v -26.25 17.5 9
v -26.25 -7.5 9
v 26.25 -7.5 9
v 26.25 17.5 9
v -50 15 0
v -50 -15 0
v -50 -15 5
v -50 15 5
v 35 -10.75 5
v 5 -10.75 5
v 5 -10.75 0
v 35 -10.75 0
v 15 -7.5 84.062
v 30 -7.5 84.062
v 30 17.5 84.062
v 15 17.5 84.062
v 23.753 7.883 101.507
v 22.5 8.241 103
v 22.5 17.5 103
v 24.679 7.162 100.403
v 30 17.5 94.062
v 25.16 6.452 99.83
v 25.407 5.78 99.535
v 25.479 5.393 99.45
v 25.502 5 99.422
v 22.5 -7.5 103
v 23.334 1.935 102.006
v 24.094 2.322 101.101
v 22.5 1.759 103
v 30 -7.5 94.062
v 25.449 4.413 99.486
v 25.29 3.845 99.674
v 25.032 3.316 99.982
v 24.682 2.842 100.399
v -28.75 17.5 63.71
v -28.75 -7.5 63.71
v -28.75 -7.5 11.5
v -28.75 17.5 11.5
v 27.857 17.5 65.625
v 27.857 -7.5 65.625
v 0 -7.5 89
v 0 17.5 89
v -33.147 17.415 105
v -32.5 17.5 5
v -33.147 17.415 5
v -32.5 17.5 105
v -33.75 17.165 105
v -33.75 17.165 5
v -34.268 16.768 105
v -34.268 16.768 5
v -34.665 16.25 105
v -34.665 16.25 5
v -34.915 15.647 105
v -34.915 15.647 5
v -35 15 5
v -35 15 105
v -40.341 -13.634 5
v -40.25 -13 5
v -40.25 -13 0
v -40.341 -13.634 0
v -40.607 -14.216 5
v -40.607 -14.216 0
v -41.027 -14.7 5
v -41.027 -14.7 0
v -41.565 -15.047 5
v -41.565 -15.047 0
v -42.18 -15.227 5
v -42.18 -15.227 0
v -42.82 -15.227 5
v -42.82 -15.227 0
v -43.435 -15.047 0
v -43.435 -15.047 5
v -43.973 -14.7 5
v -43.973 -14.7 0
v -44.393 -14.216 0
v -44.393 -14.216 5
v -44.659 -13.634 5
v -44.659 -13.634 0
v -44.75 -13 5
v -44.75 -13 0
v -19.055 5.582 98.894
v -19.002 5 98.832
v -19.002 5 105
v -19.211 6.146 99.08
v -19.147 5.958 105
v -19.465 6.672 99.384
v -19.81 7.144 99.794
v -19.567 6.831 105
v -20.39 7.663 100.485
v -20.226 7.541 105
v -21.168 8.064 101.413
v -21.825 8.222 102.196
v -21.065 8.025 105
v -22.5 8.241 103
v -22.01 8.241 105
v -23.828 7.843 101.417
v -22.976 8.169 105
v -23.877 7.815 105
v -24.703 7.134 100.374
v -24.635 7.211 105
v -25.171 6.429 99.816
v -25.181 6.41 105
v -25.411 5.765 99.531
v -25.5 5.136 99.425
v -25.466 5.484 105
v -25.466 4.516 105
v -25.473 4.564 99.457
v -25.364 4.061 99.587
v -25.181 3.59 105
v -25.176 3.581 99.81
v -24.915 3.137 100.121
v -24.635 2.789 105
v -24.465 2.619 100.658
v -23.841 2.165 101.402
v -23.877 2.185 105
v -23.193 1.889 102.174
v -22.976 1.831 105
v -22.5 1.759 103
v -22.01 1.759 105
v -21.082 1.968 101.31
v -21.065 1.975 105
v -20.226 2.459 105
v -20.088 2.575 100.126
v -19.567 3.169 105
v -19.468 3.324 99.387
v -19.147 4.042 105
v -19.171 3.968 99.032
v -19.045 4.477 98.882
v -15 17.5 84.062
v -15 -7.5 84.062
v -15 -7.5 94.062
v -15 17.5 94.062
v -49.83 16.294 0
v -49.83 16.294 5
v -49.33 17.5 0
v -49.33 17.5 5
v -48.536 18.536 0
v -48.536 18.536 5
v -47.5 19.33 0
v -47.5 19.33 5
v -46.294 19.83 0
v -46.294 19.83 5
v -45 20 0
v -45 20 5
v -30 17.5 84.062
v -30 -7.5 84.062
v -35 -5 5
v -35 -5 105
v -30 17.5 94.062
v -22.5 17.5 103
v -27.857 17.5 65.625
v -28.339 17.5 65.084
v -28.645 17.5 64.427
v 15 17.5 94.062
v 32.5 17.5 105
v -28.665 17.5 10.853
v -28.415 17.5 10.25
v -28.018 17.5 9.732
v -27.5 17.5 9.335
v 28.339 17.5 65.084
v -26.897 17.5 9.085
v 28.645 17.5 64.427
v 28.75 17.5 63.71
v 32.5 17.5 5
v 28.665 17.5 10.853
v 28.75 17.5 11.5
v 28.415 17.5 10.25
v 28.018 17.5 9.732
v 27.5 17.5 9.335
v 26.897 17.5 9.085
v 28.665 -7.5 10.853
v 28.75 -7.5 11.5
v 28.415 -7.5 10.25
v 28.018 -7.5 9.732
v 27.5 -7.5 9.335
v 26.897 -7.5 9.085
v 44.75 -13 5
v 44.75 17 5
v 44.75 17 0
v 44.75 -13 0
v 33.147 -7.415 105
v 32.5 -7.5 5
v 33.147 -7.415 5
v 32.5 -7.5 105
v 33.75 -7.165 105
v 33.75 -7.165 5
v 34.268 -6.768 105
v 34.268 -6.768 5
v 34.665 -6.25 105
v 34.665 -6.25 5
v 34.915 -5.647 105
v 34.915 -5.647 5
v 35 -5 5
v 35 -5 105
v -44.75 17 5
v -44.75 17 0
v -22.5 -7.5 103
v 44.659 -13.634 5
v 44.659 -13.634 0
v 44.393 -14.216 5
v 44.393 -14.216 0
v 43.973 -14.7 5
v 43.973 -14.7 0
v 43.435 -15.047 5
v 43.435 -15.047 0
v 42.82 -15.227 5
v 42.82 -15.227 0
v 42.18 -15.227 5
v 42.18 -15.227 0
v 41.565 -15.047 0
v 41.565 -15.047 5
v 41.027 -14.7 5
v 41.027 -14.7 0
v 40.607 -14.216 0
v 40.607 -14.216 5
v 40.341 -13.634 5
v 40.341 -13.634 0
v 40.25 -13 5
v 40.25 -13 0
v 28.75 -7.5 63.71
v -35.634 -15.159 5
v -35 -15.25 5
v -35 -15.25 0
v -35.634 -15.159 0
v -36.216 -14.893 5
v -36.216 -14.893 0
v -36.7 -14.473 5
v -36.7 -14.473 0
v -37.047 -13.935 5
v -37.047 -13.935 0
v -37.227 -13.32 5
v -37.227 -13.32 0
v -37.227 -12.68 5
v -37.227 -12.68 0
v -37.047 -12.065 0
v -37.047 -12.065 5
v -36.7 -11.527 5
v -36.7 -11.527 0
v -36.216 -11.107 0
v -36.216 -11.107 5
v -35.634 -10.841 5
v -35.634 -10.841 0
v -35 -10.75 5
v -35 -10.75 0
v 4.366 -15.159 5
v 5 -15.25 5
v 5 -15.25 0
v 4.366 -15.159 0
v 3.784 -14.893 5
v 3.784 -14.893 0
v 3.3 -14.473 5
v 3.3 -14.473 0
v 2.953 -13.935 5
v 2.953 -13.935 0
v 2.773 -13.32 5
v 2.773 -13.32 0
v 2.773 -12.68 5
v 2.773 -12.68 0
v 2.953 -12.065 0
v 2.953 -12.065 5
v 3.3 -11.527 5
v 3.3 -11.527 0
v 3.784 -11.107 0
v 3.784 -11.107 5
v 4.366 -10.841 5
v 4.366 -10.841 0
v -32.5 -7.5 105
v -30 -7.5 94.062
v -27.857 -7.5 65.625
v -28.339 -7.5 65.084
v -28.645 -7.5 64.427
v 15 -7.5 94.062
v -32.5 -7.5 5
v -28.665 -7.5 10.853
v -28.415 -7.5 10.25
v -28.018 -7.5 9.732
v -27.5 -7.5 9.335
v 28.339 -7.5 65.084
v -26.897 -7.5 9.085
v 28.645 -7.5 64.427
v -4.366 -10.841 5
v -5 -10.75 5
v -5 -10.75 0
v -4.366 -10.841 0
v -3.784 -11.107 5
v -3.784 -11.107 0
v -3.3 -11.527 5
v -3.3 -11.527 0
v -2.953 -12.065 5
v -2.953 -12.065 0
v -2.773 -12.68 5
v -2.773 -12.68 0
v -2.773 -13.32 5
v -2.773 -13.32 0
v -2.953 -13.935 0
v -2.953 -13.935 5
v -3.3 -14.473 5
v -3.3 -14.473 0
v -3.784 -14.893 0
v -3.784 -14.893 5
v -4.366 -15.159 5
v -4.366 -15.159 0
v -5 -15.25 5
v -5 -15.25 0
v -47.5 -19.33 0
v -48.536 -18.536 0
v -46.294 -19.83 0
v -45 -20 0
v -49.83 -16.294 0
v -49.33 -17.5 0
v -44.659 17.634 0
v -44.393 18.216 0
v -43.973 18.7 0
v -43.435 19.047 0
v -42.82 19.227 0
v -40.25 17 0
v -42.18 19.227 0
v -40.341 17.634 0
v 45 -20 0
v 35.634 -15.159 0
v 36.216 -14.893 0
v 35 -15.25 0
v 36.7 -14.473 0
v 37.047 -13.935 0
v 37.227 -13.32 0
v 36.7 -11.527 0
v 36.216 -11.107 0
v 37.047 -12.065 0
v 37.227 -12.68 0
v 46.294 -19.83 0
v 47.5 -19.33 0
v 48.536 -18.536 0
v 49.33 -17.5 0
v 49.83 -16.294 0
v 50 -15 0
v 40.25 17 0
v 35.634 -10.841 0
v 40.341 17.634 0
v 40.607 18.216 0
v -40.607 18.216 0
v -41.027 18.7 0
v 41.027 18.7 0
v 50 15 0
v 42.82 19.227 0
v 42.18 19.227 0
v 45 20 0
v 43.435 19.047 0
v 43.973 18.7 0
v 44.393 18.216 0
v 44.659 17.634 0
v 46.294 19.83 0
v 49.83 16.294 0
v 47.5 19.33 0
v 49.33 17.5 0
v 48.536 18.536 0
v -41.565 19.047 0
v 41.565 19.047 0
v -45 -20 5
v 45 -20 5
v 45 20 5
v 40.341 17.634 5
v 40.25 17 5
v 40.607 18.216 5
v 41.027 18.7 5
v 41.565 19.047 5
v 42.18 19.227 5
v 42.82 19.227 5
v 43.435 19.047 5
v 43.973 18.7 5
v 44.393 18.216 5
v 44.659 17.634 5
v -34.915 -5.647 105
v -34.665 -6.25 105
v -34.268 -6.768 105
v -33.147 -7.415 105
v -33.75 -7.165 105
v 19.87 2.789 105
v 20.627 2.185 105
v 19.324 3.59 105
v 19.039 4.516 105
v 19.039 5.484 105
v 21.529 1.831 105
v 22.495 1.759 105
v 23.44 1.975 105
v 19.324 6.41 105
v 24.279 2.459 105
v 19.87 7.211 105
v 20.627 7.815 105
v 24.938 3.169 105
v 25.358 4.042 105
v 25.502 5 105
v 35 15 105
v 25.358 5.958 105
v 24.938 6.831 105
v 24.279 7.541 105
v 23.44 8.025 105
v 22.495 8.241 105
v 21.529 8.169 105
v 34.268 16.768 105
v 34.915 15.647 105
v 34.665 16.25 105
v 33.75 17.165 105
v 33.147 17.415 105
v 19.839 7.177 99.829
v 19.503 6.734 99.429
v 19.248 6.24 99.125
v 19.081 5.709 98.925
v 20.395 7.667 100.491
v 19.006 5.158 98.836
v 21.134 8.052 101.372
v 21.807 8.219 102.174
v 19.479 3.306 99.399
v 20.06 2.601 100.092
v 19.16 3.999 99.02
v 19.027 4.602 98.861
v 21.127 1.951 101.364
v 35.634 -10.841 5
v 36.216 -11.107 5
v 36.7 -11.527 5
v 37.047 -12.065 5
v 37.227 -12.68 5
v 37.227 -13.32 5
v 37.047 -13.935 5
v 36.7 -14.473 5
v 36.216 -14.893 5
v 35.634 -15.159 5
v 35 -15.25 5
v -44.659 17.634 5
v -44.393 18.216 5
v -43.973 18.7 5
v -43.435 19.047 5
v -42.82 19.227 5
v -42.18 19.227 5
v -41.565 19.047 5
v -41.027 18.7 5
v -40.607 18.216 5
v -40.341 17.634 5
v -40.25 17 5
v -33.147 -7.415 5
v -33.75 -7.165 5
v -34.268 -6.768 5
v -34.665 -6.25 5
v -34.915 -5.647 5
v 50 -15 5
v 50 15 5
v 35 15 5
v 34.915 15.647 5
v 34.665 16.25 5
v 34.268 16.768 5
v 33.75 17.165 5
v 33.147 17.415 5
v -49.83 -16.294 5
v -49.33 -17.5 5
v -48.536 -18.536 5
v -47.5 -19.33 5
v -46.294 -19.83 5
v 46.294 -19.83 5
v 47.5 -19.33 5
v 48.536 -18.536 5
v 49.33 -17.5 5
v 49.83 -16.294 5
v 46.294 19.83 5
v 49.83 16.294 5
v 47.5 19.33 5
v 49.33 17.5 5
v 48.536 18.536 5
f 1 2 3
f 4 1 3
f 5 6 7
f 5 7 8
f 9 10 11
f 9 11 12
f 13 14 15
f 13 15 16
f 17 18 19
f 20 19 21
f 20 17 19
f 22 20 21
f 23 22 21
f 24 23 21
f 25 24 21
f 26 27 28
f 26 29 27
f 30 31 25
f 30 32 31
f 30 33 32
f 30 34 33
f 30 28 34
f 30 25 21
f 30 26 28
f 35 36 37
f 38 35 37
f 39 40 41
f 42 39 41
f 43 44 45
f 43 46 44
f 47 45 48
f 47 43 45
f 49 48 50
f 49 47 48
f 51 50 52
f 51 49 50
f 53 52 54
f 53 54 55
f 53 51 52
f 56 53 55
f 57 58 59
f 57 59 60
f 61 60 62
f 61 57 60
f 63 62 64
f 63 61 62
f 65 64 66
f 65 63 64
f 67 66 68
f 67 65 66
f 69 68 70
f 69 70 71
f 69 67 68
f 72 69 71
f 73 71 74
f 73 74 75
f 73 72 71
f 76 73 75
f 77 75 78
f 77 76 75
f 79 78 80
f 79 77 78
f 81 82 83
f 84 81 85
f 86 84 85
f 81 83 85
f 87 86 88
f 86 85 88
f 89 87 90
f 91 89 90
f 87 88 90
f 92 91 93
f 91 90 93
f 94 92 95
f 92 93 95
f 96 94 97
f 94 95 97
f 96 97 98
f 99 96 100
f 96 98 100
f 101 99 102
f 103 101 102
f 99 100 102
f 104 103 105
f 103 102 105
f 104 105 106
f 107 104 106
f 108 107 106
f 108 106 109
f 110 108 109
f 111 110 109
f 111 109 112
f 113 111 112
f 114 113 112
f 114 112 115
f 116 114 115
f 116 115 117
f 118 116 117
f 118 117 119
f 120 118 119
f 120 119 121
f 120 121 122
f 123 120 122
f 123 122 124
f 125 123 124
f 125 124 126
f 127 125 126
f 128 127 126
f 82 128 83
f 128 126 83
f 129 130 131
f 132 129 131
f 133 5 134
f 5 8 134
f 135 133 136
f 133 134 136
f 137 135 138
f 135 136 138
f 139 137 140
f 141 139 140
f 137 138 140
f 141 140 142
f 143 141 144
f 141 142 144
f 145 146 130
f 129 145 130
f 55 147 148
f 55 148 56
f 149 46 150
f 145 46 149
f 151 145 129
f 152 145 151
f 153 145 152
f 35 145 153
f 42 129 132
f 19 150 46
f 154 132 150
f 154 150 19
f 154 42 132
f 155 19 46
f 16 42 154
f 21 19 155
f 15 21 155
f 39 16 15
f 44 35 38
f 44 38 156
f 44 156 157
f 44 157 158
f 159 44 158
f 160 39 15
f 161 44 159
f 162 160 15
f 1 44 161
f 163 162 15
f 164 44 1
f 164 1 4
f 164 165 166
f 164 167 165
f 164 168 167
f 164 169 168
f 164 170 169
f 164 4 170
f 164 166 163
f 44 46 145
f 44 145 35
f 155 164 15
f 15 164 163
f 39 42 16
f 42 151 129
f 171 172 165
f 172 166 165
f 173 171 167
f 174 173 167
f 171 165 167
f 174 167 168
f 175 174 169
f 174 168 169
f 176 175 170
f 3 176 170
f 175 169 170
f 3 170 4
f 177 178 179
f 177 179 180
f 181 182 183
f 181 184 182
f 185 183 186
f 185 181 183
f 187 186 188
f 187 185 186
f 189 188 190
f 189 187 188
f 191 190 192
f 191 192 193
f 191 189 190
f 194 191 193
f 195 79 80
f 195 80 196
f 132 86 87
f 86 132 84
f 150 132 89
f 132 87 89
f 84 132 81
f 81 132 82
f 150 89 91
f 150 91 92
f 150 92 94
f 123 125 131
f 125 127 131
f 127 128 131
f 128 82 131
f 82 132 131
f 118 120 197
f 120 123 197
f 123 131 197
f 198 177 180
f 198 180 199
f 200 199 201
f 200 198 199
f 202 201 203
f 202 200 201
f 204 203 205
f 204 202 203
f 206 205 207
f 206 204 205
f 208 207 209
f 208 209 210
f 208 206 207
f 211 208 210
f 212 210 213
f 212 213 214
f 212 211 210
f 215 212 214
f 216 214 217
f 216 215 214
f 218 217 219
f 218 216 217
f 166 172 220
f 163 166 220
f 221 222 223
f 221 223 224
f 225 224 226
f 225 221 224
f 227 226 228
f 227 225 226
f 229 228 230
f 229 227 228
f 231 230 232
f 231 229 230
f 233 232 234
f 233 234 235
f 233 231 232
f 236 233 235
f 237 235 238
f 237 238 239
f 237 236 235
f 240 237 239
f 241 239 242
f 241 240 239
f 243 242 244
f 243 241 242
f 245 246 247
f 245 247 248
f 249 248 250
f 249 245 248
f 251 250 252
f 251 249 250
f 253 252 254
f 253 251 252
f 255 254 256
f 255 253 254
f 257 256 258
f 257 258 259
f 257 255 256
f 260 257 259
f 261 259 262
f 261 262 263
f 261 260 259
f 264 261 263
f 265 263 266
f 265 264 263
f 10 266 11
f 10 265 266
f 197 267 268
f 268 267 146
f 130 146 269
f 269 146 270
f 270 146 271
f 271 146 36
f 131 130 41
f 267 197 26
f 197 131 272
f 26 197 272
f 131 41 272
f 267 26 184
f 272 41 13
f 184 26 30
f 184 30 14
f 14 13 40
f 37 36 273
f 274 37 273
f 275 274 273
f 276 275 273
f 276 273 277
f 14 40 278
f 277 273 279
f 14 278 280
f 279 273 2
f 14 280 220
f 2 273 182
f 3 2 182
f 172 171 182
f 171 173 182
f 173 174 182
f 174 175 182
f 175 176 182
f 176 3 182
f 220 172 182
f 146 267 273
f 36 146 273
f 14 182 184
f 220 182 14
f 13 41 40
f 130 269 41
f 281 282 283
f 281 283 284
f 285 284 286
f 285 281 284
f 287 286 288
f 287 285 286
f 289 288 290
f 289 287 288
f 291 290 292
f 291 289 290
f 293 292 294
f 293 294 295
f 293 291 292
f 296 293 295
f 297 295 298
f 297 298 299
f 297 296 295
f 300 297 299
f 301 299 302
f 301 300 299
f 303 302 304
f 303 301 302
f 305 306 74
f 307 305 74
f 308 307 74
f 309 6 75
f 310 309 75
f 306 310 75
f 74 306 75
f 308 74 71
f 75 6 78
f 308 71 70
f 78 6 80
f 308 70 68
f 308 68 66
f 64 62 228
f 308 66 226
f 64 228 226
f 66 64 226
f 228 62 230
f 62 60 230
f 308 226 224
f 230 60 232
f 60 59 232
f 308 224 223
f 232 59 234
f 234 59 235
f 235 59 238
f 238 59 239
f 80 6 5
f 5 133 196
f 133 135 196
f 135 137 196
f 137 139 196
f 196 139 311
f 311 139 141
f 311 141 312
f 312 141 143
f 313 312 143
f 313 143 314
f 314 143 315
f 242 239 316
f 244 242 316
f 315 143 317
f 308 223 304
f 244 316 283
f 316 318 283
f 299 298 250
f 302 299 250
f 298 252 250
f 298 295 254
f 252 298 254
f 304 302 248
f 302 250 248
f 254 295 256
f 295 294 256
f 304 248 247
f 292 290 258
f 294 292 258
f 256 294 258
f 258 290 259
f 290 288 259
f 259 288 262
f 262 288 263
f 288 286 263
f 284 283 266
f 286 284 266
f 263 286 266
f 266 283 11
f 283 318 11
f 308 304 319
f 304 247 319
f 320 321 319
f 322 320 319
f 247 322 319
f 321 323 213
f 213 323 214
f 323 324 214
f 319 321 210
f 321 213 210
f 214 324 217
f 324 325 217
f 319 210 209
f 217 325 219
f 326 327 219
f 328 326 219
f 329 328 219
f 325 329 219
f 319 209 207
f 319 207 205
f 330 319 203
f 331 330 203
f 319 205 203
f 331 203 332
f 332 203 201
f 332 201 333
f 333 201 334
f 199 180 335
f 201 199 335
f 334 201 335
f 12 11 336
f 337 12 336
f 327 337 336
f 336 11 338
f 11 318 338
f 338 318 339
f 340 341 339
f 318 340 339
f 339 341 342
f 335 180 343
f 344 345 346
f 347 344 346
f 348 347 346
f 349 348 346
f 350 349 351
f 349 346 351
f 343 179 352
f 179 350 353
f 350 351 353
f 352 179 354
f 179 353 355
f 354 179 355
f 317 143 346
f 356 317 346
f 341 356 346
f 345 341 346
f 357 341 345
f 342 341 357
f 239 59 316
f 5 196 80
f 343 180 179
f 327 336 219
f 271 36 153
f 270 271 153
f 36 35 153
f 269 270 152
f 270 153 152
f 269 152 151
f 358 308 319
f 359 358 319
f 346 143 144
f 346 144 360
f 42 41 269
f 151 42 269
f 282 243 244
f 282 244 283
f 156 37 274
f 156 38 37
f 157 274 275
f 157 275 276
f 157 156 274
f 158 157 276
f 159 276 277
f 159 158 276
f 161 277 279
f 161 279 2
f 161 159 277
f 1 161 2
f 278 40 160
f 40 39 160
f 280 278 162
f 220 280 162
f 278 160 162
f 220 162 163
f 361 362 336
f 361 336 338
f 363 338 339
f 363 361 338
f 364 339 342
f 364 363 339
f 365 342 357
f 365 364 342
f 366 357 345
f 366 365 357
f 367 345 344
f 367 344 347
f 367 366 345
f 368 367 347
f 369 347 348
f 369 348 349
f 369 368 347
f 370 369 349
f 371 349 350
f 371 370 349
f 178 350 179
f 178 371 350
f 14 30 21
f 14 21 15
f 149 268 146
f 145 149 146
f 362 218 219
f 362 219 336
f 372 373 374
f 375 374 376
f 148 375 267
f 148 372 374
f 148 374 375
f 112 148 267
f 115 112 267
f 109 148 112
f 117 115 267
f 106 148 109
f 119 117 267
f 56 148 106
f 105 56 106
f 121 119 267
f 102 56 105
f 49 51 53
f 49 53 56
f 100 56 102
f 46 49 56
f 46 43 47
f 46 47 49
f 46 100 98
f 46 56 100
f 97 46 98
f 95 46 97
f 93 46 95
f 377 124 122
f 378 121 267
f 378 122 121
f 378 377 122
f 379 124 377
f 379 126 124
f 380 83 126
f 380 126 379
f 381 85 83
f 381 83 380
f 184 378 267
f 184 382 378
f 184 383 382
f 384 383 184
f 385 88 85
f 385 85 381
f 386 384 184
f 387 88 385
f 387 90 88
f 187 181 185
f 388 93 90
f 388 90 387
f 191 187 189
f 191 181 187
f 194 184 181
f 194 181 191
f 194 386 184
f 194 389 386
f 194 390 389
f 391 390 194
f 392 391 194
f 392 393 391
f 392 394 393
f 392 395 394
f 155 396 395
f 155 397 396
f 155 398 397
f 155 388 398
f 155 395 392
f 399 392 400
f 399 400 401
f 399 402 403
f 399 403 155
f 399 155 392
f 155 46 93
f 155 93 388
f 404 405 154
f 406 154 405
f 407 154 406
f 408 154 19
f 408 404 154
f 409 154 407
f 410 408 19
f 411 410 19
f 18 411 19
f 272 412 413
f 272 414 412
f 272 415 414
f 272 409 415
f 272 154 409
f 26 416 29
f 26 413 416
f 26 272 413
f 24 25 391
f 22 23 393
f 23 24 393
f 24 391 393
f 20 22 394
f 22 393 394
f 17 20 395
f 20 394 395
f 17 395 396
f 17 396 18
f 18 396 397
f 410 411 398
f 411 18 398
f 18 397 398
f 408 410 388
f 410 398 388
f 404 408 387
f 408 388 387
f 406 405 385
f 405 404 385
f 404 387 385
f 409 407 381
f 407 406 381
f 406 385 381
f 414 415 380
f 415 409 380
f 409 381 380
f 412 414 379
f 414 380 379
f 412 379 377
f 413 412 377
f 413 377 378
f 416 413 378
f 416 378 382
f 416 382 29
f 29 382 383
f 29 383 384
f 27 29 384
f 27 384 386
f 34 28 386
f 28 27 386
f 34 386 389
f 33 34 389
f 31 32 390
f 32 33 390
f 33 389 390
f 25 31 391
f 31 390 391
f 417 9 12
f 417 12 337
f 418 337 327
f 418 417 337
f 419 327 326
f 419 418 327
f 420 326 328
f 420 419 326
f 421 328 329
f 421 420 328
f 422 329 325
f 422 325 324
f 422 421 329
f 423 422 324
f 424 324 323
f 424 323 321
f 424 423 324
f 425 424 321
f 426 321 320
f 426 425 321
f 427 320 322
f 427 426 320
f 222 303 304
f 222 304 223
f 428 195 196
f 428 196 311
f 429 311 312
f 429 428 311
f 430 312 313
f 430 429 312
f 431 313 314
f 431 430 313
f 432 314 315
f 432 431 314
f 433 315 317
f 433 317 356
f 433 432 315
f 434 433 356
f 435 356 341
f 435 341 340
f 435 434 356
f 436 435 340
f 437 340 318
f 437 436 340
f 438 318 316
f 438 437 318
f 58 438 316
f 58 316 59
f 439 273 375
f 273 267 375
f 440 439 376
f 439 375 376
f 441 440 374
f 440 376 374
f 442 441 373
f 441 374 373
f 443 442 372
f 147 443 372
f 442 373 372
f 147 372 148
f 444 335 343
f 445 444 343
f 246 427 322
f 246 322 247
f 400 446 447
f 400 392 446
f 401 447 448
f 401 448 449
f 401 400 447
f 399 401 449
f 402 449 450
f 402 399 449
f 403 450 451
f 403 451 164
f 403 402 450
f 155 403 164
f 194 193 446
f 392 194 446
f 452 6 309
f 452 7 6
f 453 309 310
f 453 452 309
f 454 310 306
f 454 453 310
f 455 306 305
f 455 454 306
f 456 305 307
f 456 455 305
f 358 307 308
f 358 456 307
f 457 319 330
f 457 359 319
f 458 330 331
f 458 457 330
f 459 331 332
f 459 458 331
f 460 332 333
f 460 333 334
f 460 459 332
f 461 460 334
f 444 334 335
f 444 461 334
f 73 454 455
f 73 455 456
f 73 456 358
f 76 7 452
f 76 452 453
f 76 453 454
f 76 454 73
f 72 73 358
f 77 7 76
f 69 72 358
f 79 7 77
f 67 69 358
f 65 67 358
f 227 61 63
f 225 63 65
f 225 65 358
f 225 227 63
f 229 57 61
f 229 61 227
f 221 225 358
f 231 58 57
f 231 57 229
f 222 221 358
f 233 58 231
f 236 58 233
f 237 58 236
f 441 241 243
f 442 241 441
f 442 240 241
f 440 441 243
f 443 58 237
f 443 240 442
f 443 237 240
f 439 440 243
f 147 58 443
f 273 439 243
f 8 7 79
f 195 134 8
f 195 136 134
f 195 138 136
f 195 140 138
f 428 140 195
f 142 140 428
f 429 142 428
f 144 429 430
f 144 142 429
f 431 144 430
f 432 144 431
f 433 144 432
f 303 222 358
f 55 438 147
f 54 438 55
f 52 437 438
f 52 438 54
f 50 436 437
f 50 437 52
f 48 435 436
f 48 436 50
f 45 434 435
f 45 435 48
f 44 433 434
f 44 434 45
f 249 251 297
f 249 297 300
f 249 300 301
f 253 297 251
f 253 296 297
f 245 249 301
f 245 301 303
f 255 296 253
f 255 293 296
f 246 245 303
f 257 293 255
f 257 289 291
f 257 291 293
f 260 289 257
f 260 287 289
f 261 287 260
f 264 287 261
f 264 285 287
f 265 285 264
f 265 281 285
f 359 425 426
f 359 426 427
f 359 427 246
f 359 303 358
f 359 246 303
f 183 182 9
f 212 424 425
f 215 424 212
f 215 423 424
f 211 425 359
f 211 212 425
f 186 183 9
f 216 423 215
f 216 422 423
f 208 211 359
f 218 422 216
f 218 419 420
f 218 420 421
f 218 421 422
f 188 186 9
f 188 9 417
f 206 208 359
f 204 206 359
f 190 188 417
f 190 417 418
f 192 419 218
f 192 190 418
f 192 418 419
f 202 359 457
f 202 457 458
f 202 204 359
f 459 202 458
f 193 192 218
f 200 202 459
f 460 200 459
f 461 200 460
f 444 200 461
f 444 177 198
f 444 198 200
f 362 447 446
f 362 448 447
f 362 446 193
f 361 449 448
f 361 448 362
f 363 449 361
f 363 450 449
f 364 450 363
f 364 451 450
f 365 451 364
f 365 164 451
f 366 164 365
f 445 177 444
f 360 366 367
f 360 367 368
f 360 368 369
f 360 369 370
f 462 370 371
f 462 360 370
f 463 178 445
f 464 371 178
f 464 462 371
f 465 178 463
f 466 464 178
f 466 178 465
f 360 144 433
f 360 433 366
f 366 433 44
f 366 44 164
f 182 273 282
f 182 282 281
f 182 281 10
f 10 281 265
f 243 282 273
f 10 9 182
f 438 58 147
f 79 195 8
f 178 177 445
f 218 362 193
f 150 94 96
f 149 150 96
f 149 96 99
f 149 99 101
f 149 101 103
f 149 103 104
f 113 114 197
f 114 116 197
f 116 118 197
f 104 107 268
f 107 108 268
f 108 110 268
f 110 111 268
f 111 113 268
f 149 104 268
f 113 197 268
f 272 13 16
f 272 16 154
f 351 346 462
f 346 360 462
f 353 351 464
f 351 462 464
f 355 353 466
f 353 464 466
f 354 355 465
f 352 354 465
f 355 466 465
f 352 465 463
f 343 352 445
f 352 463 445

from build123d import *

# Parameters (mm, degrees)
SKETCH1_W           = 100
SKETCH1_H           = 40
BOSS_EXTRUDE1_DEPTH = 5
CUT_EXTRUDE1_DEPTH  = 5
CUT_EXTRUDE2_DEPTH  = 5
CUT_EXTRUDE3_DEPTH  = 5
CUT_EXTRUDE4_DEPTH  = 5
SKETCH3_W           = 70
SKETCH3_H           = 25
BOSS_EXTRUDE2_DEPTH = 100
FILLET1_R           = 5
FILLET2_R           = 2.5
CUT_EXTRUDE8_DEPTH  = 120.504184027
FILLET3_R           = 2.5
CUT_EXTRUDE9_DEPTH  = 120.504184027
CUT_EXTRUDE10_REACH = 120.004
SKETCH10_R          = 3.25


with BuildPart() as part:
    # Sketch1 → Boss-Extrude1 (new body)
    with BuildSketch(Plane.XY):
        Rectangle(SKETCH1_W, SKETCH1_H)
    extrude(amount=BOSS_EXTRUDE1_DEPTH)

    # Sketch2 → Cut-Extrude1 (cut)
    with BuildSketch(Plane.XY.offset(5)):
        with BuildLine():
            Line((-40.25, 17), (-40.25, -13))
            ThreePointArc((-40.25, -13), (-42.5, -15.25), (-44.75, -13))
            Line((-44.75, -13), (-44.75, 17))
            ThreePointArc((-44.75, 17), (-42.5, 19.25), (-40.25, 17))
        make_face()
    extrude(amount=-CUT_EXTRUDE1_DEPTH, mode=Mode.SUBTRACT)

    # Sketch2<3> → Cut-Extrude2 (cut)
    with BuildSketch(Plane.XY.offset(5)):
        with BuildLine():
            Line((-35, -10.75), (-5, -10.75))
            ThreePointArc((-5, -10.75), (-2.75, -13), (-5, -15.25))
            Line((-5, -15.25), (-35, -15.25))
            ThreePointArc((-35, -15.25), (-37.25, -13), (-35, -10.75))
        make_face()
    extrude(amount=-CUT_EXTRUDE2_DEPTH, mode=Mode.SUBTRACT)

    # Sketch2<4> → Cut-Extrude3 (cut)
    with BuildSketch(Plane.XY.offset(5)):
        with BuildLine():
            Line((5, -10.75), (35, -10.75))
            ThreePointArc((35, -10.75), (37.25, -13), (35, -15.25))
            Line((35, -15.25), (5, -15.25))
            ThreePointArc((5, -15.25), (2.75, -13), (5, -10.75))
        make_face()
    extrude(amount=-CUT_EXTRUDE3_DEPTH, mode=Mode.SUBTRACT)

    # Sketch2<5> → Cut-Extrude4 (cut)
    with BuildSketch(Plane.XY.offset(5)):
        with BuildLine():
            Line((44.75, 17), (44.75, -13))
            ThreePointArc((44.75, -13), (42.5, -15.25), (40.25, -13))
            Line((40.25, -13), (40.25, 17))
            ThreePointArc((40.25, 17), (42.5, 19.25), (44.75, 17))
        make_face()
    extrude(amount=-CUT_EXTRUDE4_DEPTH, mode=Mode.SUBTRACT)

    # Sketch3 → Boss-Extrude2 (add)
    with BuildSketch(Plane.XY.offset(5)):
        with Locations((0, 5)):
            Rectangle(SKETCH3_W, SKETCH3_H)
    extrude(amount=BOSS_EXTRUDE2_DEPTH)

    # Fillet1
    fillet1_edges = [part.edges().sort_by_distance(p)[0] for p in [
        (-50, 20, 2.5),
        (50, 20, 2.5),
        (50, -20, 2.5),
        (-50, -20, 2.5),
    ]]
    fillet(fillet1_edges, radius=FILLET1_R)

    # Fillet2
    fillet2_edges = [part.edges().sort_by_distance(p)[0] for p in [
        (-35, 17.5, 55),
        (35, 17.5, 55),
        (35, -7.5, 55),
        (-35, -7.5, 55),
    ]]
    fillet(fillet2_edges, radius=FILLET2_R)

    # Sketch8 → Cut-Extrude8 (cut, through all)
    with BuildSketch(Plane.XZ.offset(7.5)):
        Polygon((-28.75, 9), (28.75, 9), (28.75, 64.875885604), (0, 89), (-28.75, 64.875885604), align=None)
    extrude(amount=-CUT_EXTRUDE8_DEPTH, mode=Mode.SUBTRACT)

    # Fillet3
    fillet3_edges = [part.edges().sort_by_distance(p)[0] for p in [
        (28.75, 5, 64.875885604),
        (-28.75, 5, 64.875885604),
        (28.75, 5, 9),
        (-28.75, 5, 9),
    ]]
    fillet(fillet3_edges, radius=FILLET3_R)

    # Sketch9 → Cut-Extrude9 (cut, through all)
    with BuildSketch(Plane.XZ.offset(7.5)):
        Polygon((-30, 94.061848056), (-30, 84.061848056), (-15, 84.061848056), (-15, 94.061848056), (-22.5, 103), align=None)
        Polygon((15, 94.061848056), (22.5, 103), (30, 94.061848056), (30, 84.061848056), (15, 84.061848056), align=None)
    extrude(amount=-CUT_EXTRUDE9_DEPTH, mode=Mode.SUBTRACT)

    # Sketch10 → Cut-Extrude10 (cut, up to next)
    with BuildSketch(Plane.XY.offset(105), mode=Mode.PRIVATE) as cut_extrude10_sk1:
        with Locations((-22.252451, 5)):
            Circle(SKETCH10_R)
    cut_extrude10_tool1 = extrude(cut_extrude10_sk1.sketch, amount=-CUT_EXTRUDE10_REACH, mode=Mode.PRIVATE) & part.part
    # Sketch10 → Cut-Extrude10 (cut, up to next)
    with BuildSketch(Plane.XY.offset(105), mode=Mode.PRIVATE) as cut_extrude10_sk2:
        with Locations((22.252451, 5)):
            Circle(SKETCH10_R)
    cut_extrude10_tool2 = extrude(cut_extrude10_sk2.sketch, amount=-CUT_EXTRUDE10_REACH, mode=Mode.PRIVATE) & part.part
    add(cut_extrude10_tool1.solids().sort_by_distance((-22.252451, 5, 105))[0], mode=Mode.SUBTRACT)
    add(cut_extrude10_tool2.solids().sort_by_distance((22.252451, 5, 105))[0], mode=Mode.SUBTRACT)


solid = part.part
